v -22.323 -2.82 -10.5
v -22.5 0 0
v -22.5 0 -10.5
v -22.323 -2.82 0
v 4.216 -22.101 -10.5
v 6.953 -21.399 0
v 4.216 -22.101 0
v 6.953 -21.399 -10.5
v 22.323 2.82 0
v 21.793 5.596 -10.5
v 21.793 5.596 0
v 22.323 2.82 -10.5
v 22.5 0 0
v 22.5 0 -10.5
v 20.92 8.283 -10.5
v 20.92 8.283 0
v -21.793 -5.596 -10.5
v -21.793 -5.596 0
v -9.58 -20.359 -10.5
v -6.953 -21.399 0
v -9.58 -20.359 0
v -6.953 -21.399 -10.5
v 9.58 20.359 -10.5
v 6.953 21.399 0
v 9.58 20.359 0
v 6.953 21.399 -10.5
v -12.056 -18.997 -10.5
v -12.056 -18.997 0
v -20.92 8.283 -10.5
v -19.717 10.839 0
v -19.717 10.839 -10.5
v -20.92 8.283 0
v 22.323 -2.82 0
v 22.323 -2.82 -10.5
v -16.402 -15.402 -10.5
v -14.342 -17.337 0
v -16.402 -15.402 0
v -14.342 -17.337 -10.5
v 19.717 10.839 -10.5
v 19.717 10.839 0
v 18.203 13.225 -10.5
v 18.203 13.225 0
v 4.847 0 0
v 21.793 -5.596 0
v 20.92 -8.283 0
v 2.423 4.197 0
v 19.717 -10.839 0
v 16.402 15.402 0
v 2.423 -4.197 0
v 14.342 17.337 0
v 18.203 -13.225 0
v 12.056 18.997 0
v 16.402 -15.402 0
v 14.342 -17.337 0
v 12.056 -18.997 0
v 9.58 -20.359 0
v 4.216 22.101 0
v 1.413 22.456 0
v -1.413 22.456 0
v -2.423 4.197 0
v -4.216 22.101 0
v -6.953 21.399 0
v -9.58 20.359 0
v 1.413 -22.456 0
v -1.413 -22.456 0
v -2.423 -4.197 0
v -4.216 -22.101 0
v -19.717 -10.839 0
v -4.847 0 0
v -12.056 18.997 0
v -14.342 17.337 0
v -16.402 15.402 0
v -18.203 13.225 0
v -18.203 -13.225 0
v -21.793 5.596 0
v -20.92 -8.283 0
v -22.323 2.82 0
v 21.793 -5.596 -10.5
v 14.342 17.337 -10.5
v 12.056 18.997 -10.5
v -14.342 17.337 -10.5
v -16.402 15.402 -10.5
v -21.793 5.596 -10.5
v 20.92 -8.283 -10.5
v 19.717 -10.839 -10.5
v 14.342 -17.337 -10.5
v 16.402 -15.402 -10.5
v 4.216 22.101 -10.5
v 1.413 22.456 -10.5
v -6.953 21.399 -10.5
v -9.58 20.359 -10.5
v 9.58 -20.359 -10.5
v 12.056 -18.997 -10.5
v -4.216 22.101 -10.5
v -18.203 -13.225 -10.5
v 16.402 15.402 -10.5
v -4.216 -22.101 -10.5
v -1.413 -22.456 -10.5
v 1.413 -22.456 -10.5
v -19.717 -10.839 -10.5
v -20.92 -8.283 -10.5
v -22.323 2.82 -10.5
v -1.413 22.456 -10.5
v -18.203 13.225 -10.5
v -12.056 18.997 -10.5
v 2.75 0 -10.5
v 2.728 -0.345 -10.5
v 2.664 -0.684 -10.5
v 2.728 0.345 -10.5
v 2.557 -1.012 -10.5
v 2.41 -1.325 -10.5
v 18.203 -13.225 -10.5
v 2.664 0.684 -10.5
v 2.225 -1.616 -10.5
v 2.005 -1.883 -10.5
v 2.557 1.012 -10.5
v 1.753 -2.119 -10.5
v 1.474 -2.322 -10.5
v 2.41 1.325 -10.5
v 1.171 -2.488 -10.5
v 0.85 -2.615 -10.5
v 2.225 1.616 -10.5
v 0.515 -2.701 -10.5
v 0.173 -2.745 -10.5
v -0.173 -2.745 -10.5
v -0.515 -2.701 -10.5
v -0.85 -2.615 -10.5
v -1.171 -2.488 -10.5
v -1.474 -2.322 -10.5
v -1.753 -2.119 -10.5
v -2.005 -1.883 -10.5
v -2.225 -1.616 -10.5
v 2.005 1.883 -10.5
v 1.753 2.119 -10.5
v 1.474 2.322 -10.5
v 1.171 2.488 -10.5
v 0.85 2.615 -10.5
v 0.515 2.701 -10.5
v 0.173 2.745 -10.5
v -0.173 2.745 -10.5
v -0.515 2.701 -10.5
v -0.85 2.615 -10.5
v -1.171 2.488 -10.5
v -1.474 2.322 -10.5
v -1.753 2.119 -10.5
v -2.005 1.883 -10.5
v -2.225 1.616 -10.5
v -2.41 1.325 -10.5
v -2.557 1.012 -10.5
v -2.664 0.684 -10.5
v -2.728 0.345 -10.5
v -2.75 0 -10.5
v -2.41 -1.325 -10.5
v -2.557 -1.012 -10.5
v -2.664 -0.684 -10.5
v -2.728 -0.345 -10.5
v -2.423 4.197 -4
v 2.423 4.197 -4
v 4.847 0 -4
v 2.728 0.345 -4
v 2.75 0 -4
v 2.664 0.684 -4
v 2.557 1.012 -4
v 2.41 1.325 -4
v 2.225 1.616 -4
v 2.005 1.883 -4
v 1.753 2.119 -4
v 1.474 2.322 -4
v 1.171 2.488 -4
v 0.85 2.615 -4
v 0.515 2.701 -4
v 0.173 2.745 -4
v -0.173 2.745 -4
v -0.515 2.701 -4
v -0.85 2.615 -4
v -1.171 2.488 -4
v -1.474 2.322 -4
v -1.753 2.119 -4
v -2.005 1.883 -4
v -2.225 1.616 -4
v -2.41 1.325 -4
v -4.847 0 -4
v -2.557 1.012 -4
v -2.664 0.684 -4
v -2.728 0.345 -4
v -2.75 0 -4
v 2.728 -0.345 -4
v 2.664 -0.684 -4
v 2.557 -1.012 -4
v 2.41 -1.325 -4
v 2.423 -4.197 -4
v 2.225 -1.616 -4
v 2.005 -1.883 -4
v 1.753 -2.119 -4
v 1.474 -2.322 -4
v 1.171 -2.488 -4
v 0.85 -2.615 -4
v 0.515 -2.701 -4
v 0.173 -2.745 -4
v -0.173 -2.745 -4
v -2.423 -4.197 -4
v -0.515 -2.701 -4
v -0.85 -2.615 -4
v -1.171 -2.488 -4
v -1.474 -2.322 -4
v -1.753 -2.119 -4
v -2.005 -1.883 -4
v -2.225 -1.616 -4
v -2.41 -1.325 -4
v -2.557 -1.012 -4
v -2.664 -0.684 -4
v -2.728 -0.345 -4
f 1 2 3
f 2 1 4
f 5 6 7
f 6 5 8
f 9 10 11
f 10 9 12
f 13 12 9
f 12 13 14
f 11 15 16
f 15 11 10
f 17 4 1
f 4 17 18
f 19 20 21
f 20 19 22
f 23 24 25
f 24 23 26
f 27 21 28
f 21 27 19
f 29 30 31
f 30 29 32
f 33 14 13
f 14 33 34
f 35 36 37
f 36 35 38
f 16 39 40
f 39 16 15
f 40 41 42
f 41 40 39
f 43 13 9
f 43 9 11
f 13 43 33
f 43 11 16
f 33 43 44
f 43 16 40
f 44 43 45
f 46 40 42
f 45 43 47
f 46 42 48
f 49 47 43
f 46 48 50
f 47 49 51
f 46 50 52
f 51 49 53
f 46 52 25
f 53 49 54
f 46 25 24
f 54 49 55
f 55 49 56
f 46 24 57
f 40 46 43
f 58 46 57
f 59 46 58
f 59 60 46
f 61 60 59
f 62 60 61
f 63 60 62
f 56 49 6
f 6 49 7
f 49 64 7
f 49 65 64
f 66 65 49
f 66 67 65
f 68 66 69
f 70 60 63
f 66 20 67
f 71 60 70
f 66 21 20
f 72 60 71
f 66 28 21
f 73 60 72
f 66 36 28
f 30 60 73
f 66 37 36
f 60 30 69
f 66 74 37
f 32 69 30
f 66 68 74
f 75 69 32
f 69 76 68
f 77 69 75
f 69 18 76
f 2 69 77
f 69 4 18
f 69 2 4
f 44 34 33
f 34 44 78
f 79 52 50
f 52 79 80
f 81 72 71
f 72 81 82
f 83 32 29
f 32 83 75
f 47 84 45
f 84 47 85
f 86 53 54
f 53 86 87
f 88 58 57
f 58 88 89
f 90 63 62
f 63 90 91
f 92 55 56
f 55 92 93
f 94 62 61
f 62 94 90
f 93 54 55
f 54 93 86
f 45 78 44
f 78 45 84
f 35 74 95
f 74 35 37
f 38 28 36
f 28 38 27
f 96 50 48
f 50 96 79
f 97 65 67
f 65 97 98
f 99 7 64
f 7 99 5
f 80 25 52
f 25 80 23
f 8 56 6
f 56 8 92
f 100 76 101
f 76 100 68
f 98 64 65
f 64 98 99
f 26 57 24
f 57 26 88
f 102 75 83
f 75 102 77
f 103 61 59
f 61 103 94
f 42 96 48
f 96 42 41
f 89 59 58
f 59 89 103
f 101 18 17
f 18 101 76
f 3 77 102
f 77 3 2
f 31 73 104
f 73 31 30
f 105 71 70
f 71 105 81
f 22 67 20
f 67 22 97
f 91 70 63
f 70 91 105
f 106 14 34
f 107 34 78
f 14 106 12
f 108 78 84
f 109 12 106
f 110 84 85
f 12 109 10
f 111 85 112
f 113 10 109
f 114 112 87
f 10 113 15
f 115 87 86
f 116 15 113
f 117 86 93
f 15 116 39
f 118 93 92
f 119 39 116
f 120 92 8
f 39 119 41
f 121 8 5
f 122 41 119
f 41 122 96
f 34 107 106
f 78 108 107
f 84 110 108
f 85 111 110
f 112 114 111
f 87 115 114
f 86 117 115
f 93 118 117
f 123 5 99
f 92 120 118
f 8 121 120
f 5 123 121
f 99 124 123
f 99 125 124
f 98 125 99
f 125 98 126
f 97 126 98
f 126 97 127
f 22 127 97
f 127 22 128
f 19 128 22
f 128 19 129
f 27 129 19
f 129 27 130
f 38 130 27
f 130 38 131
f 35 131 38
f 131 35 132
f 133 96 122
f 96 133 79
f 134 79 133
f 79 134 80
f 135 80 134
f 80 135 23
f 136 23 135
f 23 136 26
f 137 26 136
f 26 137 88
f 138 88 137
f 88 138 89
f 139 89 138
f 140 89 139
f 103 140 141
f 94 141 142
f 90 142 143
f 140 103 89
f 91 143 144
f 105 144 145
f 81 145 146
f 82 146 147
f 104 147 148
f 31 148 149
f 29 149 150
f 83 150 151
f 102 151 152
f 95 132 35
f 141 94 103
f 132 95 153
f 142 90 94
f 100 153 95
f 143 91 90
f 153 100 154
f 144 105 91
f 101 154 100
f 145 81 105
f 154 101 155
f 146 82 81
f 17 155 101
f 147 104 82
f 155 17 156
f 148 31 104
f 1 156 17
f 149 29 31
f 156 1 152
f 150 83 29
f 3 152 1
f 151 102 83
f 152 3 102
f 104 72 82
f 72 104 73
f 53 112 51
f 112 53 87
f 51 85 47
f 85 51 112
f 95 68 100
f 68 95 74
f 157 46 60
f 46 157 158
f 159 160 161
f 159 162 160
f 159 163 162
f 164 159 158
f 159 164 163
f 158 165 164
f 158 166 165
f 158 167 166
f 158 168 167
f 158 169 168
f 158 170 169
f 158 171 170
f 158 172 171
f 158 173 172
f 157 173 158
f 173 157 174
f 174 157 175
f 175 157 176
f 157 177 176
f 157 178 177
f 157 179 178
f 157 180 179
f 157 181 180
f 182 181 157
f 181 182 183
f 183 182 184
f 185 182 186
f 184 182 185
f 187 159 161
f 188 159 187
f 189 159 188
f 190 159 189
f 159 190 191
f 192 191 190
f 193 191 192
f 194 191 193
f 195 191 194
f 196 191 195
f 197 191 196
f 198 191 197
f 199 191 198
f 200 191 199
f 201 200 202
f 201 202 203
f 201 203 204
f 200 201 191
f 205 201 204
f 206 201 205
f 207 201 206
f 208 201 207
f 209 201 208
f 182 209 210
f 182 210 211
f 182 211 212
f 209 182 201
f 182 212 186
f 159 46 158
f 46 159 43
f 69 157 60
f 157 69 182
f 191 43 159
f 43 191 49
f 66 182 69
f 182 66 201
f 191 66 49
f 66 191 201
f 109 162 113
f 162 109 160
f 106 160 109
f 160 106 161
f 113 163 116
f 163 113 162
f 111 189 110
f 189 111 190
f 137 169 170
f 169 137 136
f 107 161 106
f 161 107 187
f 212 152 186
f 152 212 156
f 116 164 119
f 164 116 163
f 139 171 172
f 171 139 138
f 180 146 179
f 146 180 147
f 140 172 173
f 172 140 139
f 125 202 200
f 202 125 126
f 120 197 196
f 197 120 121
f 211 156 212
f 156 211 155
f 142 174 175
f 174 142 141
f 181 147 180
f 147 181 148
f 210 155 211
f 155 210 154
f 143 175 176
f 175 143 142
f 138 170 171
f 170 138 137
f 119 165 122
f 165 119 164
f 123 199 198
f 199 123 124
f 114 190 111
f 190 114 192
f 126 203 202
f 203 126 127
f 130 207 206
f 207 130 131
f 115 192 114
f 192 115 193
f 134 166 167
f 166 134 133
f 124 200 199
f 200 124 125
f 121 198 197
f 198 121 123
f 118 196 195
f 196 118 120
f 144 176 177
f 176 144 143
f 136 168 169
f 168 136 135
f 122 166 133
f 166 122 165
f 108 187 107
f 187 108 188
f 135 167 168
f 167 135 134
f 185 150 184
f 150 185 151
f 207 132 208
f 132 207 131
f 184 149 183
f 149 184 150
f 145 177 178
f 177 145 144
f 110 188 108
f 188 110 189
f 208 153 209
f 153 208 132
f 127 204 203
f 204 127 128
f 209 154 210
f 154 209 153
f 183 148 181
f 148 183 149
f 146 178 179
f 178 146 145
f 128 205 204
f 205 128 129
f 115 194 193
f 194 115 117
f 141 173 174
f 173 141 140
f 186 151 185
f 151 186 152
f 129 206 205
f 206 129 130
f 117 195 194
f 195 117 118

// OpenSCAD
$fn = 50;


difference() {
	union() {
		translate(v = [0, 0, -10.5000000000]) {
			cylinder(h = 10.5000000000, r = 22.5000000000);
		}
		translate(v = [0, 0, -9.0000000000]) {
			cylinder(h = 9, r = 2.8750000000);
		}
	}
	union() {
		translate(v = [0, 0, 0]) {
			rotate(a = [0, 0, 0]) {
				difference() {
					union() {
						translate(v = [0, 0, -4]) {
							linear_extrude(height = 4) {
								polygon(points = [[4.8468000000, 0.0000000000], [2.4234000000, 4.1974519271], [-2.4234000000, 4.1974519271], [-4.8468000000, 0.0000000000], [-2.4234000000, -4.1974519271], [2.4234000000, -4.1974519271]]);
							}
						}
					}
					union();
				}
			}
		}
		#translate(v = [0, 0, -100.0000000000]) {
			cylinder(h = 200, r = 2.7500000000);
		}
	}
}
